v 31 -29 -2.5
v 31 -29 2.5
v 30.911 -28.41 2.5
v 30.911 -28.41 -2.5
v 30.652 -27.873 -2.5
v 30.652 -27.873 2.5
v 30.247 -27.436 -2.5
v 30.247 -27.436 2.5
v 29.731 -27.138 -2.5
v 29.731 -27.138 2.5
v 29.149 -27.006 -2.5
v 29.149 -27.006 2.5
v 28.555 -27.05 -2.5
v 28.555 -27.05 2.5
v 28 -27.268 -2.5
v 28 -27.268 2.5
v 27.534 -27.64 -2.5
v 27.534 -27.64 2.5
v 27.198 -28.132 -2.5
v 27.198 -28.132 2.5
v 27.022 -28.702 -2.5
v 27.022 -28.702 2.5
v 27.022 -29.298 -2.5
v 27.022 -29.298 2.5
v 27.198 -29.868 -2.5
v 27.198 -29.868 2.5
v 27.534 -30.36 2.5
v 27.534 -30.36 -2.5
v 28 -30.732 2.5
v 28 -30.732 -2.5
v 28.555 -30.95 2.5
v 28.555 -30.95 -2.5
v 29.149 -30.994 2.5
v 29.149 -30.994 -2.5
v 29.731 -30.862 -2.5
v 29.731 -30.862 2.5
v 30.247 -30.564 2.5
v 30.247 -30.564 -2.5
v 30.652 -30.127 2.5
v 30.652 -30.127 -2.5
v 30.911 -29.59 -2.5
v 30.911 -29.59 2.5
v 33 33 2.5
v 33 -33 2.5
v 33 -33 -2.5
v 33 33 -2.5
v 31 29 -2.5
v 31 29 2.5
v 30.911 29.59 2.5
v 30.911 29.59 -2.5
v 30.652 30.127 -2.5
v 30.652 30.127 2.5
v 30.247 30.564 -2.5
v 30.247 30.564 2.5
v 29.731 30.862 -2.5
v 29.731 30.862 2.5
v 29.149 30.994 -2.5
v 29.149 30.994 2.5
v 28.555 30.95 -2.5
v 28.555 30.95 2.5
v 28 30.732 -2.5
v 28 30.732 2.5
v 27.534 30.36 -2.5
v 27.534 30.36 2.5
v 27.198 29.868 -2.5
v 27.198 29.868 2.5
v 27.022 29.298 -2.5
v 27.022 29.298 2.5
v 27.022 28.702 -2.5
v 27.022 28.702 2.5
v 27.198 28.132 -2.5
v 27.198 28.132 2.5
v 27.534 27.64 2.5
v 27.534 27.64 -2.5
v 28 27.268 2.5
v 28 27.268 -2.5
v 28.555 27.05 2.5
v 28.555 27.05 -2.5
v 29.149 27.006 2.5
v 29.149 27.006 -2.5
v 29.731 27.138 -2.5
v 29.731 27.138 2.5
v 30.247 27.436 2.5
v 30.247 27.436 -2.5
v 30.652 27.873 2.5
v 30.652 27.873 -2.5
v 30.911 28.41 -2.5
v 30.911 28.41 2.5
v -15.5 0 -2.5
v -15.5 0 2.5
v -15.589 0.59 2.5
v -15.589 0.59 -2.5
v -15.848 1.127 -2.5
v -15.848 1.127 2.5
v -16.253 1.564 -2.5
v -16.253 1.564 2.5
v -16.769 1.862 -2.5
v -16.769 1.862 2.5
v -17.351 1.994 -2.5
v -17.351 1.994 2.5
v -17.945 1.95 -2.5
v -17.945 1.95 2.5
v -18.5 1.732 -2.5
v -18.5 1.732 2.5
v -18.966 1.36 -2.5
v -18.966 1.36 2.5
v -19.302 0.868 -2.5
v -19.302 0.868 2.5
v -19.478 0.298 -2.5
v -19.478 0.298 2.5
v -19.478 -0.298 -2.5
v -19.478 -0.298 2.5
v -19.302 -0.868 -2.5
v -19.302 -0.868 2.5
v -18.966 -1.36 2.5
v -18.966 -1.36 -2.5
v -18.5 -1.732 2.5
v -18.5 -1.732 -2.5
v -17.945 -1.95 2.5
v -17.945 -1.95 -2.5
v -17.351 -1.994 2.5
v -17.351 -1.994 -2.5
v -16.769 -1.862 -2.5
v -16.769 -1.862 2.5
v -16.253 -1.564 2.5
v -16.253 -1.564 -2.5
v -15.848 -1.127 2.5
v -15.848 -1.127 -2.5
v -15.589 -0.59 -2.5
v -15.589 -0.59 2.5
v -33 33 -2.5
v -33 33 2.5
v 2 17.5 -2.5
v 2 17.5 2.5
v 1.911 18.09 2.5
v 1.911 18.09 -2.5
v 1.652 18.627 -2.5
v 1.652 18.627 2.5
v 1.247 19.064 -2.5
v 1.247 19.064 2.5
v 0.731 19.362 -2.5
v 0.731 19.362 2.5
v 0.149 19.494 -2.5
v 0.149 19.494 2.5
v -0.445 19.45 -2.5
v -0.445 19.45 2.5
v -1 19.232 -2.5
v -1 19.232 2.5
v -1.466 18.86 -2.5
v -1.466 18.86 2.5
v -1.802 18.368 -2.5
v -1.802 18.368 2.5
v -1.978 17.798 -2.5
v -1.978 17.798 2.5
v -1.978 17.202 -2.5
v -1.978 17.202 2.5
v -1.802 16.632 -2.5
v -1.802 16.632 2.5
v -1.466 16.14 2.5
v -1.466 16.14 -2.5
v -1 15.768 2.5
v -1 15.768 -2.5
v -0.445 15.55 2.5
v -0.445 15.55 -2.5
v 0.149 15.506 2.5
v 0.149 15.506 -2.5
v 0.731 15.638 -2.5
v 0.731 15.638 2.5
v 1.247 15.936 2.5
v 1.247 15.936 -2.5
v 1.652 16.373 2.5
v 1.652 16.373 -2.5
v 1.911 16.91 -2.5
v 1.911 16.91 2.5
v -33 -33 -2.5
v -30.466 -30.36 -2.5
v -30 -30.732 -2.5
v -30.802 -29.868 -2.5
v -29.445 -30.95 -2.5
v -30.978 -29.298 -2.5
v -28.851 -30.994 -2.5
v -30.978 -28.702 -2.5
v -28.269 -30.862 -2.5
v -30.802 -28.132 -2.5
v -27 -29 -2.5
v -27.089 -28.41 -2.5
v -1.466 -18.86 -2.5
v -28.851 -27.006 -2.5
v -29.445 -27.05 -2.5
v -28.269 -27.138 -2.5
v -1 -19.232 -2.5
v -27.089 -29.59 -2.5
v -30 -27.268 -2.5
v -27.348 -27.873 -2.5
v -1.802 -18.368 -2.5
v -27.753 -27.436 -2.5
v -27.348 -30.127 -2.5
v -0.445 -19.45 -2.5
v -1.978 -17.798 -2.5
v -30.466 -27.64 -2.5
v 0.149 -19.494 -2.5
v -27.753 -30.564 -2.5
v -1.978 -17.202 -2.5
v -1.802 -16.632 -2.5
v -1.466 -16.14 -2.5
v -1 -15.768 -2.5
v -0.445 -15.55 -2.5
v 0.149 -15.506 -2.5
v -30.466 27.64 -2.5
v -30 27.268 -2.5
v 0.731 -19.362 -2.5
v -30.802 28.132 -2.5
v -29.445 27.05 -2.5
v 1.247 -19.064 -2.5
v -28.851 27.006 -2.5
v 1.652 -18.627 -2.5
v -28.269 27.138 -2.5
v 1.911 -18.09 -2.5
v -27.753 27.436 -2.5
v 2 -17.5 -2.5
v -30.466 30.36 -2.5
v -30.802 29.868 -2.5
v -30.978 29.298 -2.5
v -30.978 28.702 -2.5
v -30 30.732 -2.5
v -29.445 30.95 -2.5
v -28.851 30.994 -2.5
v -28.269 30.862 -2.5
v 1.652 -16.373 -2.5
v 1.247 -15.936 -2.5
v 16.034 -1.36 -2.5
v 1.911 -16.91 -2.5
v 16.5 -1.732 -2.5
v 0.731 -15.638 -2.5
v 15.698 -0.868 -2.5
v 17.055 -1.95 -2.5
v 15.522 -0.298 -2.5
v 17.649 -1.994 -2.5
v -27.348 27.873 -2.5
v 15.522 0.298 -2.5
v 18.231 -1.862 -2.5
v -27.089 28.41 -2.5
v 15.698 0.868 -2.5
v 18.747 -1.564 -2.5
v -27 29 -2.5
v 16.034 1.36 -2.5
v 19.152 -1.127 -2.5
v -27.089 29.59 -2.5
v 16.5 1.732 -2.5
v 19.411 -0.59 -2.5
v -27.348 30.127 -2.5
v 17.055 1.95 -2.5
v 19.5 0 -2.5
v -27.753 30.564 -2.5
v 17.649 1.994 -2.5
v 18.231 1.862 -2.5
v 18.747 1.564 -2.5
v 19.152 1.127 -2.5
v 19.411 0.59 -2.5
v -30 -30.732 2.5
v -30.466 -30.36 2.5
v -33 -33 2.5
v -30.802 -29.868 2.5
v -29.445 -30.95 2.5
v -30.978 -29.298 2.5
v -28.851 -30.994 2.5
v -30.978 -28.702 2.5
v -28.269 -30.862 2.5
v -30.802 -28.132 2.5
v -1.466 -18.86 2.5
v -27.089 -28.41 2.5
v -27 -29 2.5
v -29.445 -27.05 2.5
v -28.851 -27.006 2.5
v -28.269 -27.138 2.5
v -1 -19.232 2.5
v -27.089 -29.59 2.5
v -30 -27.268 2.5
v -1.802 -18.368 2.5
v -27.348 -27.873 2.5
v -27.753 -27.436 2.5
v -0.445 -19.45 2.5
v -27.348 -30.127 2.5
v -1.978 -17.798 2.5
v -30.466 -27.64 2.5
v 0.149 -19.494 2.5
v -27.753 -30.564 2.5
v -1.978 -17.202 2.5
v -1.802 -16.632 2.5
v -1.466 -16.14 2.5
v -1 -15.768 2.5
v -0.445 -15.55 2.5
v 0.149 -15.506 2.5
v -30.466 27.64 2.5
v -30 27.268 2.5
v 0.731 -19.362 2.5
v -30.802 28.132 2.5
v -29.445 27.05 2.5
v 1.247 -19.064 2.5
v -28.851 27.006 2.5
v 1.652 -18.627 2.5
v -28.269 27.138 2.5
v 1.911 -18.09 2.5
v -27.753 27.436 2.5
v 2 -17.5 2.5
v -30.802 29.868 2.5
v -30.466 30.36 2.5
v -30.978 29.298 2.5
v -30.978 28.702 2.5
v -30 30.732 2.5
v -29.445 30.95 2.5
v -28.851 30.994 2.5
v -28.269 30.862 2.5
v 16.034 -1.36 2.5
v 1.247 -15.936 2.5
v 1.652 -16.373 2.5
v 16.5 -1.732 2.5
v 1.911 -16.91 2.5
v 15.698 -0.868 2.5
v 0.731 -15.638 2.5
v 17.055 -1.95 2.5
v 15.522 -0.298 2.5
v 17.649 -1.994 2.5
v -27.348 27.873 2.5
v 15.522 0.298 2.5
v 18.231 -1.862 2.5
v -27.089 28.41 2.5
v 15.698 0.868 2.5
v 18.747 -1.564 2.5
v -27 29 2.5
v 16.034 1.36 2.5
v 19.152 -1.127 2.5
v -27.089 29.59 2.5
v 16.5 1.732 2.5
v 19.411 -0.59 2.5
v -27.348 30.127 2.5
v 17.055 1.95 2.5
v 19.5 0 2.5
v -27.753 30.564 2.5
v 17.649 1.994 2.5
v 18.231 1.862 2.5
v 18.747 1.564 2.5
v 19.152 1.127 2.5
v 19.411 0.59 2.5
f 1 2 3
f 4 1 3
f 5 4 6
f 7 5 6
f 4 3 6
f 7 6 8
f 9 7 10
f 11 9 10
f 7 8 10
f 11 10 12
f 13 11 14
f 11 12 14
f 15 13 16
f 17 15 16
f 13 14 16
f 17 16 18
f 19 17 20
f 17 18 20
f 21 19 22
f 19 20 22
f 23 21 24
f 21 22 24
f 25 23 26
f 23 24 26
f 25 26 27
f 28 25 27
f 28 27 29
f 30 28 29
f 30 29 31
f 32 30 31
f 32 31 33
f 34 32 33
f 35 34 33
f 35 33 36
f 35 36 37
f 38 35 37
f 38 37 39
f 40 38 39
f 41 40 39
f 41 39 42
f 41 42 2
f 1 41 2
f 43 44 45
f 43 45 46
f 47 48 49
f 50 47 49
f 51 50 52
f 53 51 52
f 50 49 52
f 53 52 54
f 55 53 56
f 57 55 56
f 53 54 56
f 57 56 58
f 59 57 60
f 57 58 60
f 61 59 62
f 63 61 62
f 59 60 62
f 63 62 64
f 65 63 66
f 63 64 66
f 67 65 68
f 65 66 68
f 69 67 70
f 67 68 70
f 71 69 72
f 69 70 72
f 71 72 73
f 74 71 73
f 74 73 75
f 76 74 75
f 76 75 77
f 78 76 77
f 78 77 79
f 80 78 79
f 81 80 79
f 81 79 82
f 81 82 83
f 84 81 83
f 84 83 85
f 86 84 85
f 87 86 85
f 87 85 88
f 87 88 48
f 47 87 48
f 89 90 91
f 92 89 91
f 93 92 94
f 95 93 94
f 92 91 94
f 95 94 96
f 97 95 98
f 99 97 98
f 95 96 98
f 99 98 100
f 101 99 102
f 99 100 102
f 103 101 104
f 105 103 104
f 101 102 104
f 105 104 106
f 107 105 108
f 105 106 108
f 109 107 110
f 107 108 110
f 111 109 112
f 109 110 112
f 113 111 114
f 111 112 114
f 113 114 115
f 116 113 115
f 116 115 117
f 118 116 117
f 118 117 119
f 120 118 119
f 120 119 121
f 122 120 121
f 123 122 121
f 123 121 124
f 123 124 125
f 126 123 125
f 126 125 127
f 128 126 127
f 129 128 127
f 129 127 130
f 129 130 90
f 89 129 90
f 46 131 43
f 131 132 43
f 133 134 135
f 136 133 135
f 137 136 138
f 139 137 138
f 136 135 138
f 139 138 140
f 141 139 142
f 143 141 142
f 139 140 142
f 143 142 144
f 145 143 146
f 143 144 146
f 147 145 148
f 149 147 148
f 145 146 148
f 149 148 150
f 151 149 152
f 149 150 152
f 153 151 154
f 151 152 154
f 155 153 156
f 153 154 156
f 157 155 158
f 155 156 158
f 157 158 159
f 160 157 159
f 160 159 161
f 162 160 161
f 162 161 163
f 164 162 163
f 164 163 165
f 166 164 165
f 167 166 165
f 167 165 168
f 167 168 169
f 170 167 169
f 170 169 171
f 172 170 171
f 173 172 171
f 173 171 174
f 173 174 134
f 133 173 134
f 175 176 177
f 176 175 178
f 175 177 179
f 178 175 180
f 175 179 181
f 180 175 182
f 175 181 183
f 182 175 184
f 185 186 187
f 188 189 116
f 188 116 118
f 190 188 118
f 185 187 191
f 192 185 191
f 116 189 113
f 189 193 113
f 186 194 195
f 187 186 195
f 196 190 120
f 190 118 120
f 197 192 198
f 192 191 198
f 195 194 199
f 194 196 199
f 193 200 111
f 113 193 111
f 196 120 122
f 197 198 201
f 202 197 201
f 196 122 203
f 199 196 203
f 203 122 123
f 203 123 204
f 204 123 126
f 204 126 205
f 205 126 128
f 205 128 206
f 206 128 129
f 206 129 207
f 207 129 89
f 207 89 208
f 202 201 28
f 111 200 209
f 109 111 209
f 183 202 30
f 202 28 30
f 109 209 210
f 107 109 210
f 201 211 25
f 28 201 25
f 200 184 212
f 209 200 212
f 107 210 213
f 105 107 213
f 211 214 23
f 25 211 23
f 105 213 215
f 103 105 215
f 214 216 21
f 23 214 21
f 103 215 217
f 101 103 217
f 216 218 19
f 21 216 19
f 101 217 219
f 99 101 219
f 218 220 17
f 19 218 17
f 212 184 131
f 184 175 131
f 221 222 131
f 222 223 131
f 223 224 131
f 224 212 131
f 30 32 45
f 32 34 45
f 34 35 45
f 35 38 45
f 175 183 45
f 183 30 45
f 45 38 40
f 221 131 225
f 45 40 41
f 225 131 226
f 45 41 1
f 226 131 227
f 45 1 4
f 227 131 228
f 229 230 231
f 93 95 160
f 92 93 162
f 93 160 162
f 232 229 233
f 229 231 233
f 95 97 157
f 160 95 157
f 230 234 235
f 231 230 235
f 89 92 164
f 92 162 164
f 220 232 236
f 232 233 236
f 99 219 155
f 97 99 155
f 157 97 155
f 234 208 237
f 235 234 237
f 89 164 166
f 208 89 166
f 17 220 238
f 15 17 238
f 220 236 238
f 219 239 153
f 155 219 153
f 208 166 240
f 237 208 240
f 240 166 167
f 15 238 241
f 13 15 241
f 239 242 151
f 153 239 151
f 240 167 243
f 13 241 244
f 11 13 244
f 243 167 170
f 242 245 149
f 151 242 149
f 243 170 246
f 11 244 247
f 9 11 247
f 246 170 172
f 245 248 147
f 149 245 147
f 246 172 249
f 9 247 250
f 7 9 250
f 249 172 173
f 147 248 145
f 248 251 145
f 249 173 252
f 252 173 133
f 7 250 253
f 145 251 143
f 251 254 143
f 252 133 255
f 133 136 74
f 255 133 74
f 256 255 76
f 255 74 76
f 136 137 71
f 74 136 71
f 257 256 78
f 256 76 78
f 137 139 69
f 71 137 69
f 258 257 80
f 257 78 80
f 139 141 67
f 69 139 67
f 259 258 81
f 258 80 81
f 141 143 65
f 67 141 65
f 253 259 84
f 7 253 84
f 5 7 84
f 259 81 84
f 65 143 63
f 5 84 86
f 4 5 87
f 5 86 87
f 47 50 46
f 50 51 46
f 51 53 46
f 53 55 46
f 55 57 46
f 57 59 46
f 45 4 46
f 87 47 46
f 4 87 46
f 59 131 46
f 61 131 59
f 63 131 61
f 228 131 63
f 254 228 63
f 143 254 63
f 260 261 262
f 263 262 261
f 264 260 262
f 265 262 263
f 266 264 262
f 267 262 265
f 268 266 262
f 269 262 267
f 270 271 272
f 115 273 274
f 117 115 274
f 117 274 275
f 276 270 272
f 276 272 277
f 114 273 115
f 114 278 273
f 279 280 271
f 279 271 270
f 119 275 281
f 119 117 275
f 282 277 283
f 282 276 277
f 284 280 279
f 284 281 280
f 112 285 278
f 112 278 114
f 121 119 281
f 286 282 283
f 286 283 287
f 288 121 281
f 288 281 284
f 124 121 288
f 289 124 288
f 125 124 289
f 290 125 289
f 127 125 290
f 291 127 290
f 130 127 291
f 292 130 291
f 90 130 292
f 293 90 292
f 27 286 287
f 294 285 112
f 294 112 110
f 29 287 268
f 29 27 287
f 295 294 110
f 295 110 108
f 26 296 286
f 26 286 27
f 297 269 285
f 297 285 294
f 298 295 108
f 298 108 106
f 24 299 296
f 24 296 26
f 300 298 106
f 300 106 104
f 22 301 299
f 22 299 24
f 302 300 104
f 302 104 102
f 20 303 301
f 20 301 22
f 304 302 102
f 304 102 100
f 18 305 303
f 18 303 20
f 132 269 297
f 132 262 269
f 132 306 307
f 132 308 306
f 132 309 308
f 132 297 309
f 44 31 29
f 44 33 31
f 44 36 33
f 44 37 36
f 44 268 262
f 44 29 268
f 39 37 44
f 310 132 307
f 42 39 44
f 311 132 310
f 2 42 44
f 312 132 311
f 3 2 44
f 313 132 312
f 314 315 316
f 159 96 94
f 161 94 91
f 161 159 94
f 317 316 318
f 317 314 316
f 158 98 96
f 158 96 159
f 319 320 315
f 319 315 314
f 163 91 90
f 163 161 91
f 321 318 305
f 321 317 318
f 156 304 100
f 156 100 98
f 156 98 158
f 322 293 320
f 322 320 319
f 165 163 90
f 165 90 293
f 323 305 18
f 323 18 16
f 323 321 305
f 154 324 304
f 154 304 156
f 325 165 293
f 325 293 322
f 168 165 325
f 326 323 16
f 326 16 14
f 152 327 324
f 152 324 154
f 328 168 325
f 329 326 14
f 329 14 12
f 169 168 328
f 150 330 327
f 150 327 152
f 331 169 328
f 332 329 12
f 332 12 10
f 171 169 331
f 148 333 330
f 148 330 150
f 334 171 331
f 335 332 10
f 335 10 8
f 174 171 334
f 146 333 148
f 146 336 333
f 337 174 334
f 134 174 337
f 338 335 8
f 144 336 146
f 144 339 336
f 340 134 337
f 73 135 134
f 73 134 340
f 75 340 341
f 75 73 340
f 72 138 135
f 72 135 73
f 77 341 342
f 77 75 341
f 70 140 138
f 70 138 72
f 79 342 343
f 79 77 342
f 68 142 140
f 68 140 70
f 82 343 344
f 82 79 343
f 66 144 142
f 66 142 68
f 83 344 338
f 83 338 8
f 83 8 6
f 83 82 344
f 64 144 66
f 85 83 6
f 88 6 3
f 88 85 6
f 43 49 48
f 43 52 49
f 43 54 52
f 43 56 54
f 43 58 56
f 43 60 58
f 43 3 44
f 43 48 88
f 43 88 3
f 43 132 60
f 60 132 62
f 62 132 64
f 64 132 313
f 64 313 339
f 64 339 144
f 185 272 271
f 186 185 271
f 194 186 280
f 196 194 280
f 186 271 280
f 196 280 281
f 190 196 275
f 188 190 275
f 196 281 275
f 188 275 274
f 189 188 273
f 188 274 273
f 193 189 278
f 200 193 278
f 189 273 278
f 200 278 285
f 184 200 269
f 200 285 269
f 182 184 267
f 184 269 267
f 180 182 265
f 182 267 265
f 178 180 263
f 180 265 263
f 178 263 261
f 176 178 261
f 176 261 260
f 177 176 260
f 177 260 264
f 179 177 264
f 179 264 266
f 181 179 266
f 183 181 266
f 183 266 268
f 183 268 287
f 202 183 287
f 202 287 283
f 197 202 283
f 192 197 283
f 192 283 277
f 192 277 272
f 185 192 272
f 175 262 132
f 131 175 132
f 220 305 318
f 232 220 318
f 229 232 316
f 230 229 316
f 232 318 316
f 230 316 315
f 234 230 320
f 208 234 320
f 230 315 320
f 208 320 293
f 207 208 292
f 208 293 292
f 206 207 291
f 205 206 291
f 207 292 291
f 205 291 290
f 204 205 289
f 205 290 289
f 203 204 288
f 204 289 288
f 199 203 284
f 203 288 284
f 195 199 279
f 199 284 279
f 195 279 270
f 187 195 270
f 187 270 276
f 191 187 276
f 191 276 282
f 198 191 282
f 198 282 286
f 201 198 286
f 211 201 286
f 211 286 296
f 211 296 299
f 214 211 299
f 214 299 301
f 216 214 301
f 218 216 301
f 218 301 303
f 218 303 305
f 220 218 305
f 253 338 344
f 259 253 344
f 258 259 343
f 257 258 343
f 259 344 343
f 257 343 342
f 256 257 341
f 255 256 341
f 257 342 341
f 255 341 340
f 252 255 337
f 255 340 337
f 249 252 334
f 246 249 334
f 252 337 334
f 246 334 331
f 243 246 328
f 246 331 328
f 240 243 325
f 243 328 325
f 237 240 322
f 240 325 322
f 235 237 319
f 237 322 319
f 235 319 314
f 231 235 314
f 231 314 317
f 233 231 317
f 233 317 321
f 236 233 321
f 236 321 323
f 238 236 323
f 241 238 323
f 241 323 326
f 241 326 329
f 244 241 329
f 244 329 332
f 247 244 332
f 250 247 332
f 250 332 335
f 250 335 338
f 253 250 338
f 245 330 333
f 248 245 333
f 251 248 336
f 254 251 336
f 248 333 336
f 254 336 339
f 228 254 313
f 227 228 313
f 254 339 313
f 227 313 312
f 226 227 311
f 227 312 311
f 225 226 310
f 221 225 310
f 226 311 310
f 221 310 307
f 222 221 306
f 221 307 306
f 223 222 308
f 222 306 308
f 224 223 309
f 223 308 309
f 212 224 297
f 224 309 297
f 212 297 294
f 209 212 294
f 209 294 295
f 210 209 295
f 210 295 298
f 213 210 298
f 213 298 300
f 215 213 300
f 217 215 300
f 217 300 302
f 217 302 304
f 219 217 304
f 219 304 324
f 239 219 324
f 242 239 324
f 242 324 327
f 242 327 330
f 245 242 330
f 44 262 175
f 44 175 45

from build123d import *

# Parameters (mm, degrees)
SKETCH1_W           = 66
SKETCH1_H           = 66
BOSS_EXTRUDE1_DEPTH = 2.5
SKETCH2_R           = 2
CUT_EXTRUDE1_DEPTH  = 6
SKETCH3_R           = 2
CUT_EXTRUDE2_DEPTH  = 6


with BuildPart() as part:
    # Sketch1 → Boss-Extrude1 (new body, symmetric)
    with BuildSketch(Plane.XY):
        Rectangle(SKETCH1_W, SKETCH1_H)
    extrude(amount=BOSS_EXTRUDE1_DEPTH, both=True)

    # Sketch2 → Cut-Extrude1 (cut, through all)
    with BuildSketch(Plane.XY.offset(2.5)):
        with Locations((-29, 29)):
            Circle(SKETCH2_R)
        with Locations((29, 29)):
            Circle(SKETCH2_R)
        with Locations((29, -29)):
            Circle(SKETCH2_R)
        with Locations((-29, -29)):
            Circle(SKETCH2_R)
    extrude(amount=-CUT_EXTRUDE1_DEPTH, mode=Mode.SUBTRACT)

    # Sketch3 → Cut-Extrude2 (cut, through all)
    with BuildSketch(Plane.XY.offset(2.5)):
        with Locations((0, 17.5)):
            Circle(SKETCH3_R)
        with Locations((17.5, 0)):
            Circle(SKETCH3_R)
        with Locations((0, -17.5)):
            Circle(SKETCH3_R)
        with Locations((-17.5, 0)):
            Circle(SKETCH3_R)
    extrude(amount=-CUT_EXTRUDE2_DEPTH, mode=Mode.SUBTRACT)


solid = part.part
